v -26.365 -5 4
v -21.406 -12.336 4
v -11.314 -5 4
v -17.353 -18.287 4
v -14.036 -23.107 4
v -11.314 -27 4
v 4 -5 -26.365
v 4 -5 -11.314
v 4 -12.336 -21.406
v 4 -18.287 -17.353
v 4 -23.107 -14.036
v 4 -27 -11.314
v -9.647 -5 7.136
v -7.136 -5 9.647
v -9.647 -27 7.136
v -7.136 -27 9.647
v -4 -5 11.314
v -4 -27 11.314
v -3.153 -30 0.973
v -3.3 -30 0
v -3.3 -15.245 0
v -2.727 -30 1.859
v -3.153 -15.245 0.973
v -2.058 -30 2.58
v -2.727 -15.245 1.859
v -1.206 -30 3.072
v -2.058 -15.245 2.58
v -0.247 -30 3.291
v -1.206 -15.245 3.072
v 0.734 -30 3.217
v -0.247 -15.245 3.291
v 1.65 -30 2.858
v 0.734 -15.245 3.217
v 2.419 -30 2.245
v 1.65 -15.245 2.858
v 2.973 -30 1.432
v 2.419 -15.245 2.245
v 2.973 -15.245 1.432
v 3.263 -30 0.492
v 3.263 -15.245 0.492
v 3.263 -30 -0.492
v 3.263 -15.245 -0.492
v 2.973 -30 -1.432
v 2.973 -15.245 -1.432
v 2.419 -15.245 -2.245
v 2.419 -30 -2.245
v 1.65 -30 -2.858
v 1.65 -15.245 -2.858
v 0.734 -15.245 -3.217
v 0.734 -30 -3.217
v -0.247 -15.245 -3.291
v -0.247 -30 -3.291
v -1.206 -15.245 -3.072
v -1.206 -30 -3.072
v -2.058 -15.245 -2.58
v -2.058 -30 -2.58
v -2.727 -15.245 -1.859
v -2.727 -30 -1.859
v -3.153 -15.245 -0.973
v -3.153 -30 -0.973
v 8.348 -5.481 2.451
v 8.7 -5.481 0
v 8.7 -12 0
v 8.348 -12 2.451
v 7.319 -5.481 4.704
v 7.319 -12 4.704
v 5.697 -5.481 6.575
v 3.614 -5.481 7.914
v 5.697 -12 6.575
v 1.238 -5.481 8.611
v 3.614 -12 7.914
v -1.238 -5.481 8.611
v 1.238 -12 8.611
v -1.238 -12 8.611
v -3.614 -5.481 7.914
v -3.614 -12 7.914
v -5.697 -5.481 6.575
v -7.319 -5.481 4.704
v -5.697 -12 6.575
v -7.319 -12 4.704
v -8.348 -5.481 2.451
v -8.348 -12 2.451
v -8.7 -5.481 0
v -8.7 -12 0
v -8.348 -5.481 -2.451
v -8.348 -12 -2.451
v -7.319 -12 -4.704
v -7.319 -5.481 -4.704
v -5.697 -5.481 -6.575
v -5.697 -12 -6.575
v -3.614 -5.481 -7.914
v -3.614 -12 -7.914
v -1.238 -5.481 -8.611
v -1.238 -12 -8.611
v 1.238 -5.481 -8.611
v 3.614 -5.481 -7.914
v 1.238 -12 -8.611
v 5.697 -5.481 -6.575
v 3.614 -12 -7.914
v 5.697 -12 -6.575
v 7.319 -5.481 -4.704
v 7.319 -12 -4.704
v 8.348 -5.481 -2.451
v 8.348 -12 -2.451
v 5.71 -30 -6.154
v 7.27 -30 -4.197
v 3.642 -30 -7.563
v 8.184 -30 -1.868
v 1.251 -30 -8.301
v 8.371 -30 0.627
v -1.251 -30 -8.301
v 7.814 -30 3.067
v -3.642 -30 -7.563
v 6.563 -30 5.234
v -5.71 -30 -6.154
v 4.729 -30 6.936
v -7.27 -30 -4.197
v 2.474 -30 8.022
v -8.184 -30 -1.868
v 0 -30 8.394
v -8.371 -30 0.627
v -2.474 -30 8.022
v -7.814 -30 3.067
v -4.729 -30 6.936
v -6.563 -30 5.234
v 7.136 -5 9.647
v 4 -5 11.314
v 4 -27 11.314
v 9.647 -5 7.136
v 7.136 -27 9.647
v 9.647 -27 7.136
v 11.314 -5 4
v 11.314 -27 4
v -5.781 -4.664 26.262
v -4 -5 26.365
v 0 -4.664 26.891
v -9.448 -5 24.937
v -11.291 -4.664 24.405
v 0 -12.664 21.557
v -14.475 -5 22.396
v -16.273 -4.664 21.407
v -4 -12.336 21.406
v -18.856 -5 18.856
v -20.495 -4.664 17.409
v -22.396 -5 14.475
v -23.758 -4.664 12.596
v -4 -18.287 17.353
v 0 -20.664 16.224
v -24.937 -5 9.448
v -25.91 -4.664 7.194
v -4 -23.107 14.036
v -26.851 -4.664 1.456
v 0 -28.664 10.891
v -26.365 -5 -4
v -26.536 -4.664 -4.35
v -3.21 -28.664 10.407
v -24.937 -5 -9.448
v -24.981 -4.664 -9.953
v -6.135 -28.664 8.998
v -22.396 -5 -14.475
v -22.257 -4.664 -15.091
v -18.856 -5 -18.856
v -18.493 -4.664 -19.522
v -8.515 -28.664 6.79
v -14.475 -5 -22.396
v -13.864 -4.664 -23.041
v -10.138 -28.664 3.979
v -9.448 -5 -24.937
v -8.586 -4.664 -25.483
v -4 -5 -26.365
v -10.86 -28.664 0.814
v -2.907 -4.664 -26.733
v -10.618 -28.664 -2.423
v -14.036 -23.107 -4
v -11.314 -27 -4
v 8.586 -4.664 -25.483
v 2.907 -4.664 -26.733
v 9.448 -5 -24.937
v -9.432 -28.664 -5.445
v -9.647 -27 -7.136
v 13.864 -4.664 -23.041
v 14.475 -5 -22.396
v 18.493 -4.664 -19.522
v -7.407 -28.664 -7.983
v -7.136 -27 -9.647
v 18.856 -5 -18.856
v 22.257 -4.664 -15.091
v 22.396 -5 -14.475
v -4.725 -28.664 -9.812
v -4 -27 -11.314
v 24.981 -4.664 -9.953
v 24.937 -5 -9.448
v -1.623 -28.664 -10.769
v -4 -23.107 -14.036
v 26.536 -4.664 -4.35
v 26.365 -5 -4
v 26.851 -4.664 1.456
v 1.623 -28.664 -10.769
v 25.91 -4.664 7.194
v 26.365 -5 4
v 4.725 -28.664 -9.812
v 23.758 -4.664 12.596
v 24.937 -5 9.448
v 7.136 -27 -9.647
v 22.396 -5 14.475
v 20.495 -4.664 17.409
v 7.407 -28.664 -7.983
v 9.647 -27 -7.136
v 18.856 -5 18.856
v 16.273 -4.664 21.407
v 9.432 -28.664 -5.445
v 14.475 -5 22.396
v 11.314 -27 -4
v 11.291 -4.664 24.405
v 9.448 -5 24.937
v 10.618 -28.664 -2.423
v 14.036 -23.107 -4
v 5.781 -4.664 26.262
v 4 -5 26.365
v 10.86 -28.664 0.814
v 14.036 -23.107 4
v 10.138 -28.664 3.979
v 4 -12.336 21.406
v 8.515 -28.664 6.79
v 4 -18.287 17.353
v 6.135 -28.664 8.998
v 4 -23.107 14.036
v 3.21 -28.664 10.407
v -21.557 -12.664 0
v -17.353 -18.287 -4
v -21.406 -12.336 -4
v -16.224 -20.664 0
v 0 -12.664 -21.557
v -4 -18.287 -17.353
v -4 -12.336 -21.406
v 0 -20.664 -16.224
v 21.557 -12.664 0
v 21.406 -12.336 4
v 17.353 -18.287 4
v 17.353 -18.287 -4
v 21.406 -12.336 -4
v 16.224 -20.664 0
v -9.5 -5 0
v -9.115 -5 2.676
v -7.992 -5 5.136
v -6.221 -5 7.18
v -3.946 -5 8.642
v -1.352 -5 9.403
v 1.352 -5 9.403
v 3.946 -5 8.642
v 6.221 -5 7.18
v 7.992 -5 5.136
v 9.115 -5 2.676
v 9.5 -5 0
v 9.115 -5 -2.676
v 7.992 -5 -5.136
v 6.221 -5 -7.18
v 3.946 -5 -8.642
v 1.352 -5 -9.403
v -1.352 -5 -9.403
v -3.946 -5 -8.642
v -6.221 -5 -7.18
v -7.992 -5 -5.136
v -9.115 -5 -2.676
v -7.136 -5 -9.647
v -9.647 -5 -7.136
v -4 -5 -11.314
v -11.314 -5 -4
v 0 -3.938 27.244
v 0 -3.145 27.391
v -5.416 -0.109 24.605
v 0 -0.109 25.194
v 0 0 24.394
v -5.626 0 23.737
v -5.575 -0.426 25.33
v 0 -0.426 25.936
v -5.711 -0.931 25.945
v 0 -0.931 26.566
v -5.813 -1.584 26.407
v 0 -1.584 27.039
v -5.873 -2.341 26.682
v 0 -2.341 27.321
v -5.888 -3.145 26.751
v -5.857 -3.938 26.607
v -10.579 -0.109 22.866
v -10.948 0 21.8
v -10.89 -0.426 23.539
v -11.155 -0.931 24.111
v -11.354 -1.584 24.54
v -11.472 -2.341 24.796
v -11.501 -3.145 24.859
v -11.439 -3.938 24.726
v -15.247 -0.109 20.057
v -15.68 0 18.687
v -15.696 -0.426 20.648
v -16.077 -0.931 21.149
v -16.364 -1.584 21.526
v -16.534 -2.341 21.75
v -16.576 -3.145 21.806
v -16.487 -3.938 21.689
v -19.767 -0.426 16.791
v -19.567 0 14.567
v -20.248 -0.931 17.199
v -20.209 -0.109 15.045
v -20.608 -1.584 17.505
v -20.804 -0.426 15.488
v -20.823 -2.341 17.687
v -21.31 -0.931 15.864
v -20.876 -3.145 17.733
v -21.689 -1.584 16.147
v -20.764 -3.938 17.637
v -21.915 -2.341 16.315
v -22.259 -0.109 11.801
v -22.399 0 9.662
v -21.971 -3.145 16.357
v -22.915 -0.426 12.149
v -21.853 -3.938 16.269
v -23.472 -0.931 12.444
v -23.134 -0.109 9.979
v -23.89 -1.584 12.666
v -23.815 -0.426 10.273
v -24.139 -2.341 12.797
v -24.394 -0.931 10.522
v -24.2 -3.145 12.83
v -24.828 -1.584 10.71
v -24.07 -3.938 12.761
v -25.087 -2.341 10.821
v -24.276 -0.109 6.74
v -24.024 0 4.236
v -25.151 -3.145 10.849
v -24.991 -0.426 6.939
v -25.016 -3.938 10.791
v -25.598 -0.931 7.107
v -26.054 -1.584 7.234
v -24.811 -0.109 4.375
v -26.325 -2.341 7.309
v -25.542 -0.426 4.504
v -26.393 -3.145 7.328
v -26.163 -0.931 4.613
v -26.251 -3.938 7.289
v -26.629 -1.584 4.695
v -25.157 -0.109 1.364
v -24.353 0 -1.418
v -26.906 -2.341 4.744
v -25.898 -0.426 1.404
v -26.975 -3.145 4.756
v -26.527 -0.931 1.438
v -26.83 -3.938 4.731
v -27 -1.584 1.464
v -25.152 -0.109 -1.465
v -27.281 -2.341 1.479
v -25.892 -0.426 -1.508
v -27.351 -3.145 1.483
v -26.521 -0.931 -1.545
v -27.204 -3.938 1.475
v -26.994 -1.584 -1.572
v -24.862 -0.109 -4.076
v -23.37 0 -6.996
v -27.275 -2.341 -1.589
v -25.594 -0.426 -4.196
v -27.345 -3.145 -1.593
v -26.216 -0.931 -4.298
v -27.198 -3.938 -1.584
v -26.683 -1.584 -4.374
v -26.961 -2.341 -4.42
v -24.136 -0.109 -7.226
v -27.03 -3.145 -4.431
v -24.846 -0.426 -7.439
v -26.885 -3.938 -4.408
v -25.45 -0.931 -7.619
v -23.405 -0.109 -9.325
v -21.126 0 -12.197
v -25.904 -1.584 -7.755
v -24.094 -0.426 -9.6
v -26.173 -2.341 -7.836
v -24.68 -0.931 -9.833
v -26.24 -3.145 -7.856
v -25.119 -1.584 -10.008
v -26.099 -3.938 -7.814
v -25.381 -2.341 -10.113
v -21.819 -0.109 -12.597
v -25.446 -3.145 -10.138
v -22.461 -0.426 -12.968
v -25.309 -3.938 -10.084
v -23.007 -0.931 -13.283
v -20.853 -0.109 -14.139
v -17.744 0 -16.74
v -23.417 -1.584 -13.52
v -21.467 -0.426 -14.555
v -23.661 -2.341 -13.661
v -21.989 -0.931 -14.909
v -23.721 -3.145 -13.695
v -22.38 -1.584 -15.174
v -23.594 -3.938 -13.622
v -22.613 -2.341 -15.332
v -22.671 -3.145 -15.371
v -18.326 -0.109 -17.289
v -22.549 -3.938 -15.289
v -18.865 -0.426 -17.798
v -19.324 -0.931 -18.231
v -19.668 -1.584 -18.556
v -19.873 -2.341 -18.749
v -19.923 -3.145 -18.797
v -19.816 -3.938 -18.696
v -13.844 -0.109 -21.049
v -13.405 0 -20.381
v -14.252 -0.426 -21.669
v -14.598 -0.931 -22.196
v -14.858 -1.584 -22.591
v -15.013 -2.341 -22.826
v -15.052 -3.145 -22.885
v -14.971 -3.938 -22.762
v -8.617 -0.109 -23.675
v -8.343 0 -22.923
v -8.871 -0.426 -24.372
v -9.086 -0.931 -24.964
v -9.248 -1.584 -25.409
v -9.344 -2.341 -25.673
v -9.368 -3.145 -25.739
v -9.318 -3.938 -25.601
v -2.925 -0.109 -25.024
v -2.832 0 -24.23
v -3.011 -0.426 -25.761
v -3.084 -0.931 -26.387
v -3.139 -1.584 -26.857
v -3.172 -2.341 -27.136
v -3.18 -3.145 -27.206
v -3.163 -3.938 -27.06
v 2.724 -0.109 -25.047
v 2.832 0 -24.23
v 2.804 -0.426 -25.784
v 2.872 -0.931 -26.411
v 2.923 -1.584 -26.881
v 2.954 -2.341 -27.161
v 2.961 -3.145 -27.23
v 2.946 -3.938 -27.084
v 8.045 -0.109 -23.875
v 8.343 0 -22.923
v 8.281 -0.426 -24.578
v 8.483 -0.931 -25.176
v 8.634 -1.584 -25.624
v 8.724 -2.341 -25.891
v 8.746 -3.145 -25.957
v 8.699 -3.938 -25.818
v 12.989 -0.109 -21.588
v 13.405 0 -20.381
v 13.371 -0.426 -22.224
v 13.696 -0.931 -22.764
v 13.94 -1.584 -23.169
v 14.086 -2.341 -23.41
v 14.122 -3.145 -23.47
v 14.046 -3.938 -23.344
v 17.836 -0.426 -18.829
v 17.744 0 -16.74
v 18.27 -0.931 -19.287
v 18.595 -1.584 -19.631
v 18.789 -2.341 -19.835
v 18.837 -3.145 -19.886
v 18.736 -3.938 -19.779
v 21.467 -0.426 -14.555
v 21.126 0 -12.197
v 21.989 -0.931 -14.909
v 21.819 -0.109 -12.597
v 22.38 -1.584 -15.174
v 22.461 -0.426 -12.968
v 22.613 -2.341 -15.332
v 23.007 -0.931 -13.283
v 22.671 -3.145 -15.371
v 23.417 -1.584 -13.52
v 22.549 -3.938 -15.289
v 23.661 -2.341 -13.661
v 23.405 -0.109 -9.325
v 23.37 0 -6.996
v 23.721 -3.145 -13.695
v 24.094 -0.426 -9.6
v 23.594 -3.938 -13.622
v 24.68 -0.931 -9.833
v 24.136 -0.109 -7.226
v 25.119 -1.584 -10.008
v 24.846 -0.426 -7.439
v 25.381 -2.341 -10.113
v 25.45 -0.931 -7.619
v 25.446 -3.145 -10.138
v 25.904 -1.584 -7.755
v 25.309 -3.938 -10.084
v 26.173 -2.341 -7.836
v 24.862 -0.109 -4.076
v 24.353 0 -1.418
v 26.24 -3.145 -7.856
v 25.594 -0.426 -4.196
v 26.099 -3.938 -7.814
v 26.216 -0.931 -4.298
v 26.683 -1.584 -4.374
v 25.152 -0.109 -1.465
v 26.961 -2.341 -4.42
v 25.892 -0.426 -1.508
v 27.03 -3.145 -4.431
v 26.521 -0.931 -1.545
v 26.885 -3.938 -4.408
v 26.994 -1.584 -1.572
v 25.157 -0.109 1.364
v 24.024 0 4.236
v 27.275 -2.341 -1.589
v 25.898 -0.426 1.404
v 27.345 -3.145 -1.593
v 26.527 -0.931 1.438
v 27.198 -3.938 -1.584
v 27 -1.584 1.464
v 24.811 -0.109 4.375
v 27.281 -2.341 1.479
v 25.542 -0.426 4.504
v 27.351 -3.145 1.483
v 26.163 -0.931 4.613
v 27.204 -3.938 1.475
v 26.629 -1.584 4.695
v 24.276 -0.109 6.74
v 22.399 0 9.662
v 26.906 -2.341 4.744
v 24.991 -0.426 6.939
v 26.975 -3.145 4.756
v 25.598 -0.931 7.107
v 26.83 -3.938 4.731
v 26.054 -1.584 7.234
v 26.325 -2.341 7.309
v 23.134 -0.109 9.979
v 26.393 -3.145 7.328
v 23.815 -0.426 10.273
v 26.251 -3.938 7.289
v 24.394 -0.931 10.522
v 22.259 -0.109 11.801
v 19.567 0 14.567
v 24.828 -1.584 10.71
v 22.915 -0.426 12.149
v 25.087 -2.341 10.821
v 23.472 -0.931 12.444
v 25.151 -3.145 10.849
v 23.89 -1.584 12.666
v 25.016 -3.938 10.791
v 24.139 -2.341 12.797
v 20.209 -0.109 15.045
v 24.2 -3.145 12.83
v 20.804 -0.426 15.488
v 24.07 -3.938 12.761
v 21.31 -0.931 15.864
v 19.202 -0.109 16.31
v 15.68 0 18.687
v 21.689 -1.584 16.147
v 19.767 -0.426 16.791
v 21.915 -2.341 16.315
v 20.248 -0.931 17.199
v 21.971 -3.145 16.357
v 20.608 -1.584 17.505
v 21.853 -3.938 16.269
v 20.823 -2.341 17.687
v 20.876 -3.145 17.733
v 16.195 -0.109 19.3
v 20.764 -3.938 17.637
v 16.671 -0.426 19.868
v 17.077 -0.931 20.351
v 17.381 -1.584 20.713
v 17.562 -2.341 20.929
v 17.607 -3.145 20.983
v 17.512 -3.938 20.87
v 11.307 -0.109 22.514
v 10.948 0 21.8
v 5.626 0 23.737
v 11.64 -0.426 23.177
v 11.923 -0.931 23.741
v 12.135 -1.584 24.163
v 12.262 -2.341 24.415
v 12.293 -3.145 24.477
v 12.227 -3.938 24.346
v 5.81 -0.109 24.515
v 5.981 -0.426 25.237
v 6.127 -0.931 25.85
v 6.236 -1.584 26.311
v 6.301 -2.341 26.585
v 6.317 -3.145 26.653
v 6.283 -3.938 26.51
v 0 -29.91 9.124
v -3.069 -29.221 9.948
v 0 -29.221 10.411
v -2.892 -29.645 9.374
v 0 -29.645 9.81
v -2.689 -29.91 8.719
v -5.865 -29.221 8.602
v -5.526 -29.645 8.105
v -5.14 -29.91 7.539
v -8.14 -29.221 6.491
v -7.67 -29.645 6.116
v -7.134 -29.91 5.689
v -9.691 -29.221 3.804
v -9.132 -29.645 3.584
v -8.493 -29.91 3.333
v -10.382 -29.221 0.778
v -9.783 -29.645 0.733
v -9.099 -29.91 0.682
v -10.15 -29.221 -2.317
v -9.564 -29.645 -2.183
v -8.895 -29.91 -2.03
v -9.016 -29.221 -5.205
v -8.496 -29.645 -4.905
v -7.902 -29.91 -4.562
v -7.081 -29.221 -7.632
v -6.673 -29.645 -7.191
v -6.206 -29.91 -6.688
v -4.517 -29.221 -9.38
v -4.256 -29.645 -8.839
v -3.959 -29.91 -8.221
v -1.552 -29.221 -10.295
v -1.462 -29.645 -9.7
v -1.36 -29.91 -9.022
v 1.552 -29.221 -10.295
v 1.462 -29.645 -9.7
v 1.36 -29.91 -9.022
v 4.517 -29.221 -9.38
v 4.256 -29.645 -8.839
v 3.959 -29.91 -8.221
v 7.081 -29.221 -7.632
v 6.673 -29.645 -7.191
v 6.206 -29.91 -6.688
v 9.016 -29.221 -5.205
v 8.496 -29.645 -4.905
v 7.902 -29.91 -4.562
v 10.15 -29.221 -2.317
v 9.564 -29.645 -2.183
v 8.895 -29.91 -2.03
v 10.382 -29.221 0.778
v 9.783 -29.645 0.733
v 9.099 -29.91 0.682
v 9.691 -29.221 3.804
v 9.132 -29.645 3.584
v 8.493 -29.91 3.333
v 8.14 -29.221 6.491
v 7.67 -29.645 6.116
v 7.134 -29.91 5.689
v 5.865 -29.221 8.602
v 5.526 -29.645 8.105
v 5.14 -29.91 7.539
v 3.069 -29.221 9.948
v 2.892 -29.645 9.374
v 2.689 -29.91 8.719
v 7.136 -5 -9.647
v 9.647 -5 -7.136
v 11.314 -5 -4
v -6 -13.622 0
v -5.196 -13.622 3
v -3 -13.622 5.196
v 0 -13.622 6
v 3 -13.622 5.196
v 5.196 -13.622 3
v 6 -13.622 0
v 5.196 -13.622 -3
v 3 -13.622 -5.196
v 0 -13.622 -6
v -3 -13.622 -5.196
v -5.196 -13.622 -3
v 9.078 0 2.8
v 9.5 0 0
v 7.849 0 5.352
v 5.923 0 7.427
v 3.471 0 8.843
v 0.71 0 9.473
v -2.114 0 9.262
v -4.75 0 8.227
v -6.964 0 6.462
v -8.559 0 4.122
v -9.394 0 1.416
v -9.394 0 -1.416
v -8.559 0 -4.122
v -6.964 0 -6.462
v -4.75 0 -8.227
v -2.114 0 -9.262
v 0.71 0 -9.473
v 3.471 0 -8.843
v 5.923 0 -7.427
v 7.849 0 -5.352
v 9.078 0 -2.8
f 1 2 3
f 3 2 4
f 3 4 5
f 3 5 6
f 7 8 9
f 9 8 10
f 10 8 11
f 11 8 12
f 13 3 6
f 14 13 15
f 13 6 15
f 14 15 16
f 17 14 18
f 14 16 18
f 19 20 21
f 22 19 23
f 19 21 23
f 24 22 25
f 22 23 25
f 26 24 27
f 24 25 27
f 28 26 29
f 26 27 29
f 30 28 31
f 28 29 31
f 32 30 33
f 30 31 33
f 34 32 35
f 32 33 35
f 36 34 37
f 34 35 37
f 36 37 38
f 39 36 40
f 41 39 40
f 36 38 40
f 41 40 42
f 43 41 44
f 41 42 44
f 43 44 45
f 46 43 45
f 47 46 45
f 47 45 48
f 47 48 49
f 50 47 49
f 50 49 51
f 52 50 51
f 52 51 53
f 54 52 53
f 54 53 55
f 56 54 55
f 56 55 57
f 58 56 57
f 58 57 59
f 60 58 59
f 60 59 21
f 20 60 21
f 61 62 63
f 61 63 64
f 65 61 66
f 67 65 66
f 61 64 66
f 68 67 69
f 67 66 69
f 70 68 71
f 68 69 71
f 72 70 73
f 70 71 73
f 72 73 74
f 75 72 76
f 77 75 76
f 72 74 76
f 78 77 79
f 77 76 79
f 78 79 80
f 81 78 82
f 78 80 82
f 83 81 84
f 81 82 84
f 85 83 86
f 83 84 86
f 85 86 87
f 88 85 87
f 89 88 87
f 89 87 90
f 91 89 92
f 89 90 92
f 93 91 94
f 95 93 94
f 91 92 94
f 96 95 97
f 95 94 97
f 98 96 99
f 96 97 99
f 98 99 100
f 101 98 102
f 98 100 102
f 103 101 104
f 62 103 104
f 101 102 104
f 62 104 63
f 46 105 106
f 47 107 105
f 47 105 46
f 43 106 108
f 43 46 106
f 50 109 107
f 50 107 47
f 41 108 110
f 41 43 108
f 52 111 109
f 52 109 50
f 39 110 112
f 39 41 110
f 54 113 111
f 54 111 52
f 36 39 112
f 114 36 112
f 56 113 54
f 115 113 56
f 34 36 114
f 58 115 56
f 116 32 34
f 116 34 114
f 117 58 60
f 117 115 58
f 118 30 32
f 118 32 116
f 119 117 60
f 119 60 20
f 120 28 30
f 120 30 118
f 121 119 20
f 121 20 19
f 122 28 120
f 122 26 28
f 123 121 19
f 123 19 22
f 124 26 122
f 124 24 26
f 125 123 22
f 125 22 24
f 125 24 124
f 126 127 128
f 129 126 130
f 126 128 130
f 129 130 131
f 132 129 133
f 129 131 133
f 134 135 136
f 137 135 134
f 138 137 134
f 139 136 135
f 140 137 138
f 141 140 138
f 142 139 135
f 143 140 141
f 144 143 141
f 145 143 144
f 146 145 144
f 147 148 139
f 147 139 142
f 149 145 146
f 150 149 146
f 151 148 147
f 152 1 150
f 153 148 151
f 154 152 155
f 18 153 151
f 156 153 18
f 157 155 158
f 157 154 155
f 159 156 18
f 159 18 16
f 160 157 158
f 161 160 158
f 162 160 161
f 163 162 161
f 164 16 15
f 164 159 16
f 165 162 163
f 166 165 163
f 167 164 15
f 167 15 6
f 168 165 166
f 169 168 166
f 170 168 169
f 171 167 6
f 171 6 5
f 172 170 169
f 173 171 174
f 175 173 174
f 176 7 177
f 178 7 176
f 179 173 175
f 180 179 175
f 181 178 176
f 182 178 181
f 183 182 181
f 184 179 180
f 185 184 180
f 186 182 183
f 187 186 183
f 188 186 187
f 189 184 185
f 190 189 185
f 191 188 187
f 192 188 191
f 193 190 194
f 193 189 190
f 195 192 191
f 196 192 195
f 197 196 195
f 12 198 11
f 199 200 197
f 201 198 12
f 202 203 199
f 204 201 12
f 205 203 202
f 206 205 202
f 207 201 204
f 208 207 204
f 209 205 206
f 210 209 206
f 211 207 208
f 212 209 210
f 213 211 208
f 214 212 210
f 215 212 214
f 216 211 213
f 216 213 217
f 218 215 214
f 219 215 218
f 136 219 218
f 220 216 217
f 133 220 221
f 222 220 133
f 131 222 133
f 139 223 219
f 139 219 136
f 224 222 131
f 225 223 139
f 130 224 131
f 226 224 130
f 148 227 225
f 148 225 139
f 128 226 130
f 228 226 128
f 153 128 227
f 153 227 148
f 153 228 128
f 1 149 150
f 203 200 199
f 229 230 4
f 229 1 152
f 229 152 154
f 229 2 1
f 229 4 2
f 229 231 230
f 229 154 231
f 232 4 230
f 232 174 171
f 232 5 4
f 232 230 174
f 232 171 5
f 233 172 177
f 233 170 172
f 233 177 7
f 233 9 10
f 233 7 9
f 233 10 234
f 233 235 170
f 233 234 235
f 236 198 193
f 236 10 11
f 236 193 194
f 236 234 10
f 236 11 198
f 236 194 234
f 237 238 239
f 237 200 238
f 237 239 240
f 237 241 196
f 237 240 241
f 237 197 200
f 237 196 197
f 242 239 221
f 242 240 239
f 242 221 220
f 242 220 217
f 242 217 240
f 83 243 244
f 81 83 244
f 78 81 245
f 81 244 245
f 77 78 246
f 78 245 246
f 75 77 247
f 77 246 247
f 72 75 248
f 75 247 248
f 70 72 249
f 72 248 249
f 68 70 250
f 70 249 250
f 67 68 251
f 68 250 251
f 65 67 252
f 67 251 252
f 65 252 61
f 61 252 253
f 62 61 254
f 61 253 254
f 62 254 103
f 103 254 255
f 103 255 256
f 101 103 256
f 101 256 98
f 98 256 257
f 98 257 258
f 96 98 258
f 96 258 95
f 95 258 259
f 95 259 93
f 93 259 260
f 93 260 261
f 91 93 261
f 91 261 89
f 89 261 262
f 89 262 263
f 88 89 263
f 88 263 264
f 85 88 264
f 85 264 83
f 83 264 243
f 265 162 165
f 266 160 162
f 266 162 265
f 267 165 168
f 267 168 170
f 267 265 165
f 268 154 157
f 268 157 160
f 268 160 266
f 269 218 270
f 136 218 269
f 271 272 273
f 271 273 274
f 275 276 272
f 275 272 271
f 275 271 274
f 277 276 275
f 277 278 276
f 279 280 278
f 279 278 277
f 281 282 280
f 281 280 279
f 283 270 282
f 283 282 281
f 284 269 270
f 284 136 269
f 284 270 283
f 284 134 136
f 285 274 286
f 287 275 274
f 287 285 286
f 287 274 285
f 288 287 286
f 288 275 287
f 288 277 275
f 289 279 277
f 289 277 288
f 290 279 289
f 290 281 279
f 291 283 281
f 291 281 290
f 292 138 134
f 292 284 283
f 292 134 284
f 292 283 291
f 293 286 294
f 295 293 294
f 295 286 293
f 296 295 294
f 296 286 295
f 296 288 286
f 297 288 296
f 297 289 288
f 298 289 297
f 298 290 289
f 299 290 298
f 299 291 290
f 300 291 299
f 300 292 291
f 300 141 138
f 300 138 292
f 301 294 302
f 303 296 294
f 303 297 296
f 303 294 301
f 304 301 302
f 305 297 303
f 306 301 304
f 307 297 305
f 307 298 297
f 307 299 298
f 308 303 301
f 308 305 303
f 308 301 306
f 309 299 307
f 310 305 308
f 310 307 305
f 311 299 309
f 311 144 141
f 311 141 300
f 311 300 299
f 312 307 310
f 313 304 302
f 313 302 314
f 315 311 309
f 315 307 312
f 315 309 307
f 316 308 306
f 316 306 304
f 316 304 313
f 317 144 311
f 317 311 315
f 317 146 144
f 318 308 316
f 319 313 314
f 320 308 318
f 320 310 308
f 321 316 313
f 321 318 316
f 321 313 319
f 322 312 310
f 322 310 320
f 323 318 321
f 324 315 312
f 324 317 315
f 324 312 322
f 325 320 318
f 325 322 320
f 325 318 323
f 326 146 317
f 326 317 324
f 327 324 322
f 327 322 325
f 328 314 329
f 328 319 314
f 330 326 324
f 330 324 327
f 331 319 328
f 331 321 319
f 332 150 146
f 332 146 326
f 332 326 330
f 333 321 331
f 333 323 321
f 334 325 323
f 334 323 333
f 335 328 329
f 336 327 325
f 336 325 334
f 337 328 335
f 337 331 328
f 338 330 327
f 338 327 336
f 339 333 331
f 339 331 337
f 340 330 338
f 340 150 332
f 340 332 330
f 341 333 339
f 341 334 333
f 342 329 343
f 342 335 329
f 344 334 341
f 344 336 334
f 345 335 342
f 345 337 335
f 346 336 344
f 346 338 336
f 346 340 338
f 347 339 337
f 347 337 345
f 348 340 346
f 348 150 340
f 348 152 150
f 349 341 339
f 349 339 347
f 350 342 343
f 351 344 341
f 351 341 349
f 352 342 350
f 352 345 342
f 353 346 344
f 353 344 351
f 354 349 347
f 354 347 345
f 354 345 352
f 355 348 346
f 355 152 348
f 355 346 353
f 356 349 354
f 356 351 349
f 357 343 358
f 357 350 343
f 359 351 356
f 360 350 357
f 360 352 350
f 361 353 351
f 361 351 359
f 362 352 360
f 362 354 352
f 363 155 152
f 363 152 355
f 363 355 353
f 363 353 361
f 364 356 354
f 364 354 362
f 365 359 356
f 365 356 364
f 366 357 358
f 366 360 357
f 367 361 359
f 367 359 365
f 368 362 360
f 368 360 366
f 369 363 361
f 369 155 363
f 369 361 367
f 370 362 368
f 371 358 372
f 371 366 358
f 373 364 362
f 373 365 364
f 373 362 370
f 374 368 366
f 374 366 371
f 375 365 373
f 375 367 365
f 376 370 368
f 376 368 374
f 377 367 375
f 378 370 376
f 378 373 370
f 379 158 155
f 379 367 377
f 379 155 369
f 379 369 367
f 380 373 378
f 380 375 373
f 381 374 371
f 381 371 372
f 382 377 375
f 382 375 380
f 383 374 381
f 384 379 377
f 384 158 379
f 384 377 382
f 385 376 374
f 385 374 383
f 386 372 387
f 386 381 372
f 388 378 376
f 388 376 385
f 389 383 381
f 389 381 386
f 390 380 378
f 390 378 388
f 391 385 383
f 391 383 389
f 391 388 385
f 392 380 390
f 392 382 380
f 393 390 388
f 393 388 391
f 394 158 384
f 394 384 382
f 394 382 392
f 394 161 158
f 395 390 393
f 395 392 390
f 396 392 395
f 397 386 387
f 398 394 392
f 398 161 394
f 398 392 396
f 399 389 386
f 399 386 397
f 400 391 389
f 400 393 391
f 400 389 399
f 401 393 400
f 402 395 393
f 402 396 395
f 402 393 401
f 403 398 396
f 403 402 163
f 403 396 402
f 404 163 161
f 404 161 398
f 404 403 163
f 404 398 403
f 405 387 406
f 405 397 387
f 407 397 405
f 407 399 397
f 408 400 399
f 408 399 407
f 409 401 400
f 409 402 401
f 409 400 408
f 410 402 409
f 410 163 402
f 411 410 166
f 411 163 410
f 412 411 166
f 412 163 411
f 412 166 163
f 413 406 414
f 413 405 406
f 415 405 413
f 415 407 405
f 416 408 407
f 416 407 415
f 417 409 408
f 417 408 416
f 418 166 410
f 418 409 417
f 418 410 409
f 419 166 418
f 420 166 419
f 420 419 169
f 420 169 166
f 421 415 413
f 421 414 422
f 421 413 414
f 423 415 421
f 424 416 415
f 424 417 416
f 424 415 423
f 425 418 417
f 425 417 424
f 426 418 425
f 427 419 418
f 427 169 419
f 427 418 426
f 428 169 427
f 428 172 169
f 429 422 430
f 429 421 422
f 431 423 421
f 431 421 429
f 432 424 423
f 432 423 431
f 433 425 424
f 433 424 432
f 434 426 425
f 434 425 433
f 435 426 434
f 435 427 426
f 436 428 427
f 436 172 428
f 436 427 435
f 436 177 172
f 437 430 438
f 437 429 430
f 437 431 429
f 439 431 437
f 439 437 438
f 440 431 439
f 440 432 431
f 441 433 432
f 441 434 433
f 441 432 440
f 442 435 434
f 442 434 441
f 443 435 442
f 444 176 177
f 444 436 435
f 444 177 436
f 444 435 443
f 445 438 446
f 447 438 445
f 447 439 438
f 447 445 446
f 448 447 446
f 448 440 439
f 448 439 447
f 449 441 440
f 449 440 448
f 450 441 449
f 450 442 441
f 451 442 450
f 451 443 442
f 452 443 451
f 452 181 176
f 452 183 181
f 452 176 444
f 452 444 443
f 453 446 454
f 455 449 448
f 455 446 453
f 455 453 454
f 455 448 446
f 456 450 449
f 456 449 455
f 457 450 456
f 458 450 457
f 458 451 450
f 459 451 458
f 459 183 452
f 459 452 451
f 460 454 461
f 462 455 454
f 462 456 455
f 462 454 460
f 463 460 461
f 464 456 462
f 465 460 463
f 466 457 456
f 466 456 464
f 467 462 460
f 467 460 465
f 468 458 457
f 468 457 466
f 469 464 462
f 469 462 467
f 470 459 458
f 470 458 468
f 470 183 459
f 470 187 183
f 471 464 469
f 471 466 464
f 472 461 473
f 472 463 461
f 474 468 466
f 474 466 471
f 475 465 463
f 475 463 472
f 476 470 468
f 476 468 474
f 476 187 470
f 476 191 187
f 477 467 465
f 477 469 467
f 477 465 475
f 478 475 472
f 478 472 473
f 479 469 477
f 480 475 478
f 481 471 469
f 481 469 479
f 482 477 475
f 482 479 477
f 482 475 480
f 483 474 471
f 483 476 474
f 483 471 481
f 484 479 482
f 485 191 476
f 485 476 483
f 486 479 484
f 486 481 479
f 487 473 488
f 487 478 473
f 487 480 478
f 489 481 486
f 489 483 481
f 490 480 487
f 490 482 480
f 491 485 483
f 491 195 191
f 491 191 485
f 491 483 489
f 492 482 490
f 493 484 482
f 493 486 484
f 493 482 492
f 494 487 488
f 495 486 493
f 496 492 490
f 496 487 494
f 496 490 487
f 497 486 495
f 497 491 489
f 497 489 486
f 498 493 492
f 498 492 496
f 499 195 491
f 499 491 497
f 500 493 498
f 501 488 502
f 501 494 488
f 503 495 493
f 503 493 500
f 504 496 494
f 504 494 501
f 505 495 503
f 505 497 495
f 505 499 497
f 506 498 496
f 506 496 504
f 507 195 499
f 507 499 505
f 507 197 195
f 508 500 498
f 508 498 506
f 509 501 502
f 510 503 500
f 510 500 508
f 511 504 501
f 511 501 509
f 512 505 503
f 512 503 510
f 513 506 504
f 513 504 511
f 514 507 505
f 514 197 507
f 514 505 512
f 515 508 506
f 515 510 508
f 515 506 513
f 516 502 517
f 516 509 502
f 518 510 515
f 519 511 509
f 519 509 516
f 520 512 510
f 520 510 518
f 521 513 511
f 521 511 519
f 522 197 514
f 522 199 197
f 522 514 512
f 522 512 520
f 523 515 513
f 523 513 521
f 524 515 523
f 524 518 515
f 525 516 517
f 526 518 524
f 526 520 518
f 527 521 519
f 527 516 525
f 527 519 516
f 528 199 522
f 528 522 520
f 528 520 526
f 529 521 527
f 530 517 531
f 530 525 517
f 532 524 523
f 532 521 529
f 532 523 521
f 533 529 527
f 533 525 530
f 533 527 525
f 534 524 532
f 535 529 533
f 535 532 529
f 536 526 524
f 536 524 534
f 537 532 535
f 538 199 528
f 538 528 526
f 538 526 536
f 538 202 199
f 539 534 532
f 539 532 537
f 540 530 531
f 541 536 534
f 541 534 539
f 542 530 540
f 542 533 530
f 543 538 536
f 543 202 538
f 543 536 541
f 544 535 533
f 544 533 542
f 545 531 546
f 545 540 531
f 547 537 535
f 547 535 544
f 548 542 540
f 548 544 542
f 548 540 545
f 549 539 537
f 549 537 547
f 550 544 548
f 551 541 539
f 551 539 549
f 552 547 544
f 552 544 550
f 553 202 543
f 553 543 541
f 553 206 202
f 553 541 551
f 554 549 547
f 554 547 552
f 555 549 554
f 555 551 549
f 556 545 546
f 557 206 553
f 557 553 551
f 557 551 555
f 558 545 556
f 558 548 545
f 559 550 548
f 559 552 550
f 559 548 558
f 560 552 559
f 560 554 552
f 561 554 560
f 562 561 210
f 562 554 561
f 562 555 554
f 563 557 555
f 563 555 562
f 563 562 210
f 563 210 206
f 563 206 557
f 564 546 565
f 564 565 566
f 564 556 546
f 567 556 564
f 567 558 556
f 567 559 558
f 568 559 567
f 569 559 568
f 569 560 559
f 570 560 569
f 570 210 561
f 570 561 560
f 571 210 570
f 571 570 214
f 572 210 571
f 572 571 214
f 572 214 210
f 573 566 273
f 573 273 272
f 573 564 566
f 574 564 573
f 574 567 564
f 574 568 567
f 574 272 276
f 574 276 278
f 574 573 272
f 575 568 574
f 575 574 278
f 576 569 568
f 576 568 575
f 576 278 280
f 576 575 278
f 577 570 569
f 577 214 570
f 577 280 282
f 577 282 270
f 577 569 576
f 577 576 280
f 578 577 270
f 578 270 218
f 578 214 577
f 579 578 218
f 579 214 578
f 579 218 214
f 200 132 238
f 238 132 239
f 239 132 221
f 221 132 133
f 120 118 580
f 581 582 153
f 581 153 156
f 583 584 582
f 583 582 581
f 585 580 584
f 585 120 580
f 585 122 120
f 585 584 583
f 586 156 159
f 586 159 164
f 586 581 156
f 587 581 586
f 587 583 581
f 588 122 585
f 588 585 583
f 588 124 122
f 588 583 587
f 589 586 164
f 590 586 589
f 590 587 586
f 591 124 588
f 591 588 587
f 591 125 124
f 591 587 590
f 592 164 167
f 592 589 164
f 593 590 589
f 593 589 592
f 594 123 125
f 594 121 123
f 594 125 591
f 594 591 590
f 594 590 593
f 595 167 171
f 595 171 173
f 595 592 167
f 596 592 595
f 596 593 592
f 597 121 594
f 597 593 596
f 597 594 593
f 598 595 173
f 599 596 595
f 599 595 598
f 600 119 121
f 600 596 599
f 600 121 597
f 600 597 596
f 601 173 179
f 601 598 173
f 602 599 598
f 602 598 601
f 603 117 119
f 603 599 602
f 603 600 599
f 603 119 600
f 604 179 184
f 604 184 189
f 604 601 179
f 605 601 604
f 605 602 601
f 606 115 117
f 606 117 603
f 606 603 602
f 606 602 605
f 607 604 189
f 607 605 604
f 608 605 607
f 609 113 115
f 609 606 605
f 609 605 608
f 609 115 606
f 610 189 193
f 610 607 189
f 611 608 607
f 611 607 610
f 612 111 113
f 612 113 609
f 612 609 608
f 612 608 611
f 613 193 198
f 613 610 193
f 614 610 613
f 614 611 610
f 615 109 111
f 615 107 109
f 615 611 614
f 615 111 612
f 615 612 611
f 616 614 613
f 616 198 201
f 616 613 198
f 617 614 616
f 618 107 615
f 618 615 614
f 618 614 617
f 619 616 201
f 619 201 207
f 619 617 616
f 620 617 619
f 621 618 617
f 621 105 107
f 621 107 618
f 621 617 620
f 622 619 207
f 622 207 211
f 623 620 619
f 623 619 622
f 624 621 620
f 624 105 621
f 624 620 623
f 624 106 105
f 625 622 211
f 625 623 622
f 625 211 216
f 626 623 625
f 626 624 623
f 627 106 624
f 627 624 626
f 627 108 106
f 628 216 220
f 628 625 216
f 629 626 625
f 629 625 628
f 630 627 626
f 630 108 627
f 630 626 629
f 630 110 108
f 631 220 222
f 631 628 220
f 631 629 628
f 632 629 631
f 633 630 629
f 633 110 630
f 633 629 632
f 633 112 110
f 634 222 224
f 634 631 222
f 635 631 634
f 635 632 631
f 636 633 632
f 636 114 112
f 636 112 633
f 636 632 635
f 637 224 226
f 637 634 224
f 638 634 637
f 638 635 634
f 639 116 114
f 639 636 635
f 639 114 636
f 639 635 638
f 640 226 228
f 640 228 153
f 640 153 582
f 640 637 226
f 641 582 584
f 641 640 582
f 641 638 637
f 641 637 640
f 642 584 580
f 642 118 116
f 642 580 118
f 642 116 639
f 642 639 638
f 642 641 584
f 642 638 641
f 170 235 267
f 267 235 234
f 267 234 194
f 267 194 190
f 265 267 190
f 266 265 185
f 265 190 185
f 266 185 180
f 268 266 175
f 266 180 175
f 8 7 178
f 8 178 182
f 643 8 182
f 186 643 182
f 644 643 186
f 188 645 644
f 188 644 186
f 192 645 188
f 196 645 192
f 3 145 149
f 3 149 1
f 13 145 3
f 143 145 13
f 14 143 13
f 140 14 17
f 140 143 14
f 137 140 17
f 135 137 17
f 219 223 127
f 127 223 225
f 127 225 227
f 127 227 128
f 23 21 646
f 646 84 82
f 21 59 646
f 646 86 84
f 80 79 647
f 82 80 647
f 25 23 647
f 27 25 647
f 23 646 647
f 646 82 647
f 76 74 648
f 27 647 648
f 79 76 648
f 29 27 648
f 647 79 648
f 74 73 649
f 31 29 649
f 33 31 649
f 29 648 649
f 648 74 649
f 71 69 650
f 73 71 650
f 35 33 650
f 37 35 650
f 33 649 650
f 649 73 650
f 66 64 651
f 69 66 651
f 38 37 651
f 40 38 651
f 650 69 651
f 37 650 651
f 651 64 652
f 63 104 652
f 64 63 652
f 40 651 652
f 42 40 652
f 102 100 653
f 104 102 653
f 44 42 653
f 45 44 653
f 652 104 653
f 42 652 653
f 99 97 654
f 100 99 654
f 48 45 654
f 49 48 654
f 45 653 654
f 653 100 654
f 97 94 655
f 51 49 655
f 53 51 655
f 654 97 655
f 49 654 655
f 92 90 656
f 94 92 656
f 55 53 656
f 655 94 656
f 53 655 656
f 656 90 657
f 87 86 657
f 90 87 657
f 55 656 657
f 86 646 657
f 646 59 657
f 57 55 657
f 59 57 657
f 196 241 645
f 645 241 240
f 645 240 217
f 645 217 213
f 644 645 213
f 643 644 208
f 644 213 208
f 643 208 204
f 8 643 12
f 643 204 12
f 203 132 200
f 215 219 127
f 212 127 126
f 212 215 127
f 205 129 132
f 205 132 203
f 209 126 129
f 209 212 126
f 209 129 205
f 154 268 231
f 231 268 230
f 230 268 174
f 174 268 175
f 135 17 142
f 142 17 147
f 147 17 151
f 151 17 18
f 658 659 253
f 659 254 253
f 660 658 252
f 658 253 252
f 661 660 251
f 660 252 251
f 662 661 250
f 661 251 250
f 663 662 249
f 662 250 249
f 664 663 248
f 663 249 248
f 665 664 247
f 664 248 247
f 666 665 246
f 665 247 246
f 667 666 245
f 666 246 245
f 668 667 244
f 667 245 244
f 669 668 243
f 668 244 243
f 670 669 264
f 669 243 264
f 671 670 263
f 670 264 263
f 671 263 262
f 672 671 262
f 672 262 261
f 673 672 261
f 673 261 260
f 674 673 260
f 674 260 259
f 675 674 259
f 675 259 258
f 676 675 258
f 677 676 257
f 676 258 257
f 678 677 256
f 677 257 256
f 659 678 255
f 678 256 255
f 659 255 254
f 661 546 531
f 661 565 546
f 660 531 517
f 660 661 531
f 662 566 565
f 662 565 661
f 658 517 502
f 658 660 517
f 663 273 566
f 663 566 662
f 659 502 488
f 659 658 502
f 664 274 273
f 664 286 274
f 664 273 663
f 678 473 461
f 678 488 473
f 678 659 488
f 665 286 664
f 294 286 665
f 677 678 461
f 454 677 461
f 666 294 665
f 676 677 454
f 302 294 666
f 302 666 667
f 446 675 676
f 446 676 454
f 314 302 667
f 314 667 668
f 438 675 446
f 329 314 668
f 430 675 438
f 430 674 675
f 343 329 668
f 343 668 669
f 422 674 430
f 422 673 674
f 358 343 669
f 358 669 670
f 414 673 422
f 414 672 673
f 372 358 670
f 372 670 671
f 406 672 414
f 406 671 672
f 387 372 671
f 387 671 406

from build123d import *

# Parameters (mm, degrees)
F3_D     = 6.6
F5_D     = 17.4
F5_DEPTH = 12
F5_TIP   = 5.2274873855
F6_D     = 19
F6_DEPTH = 5
F6_TIP   = 5.7081758808
F7_DEPTH = 25
F8_R     = 3


with BuildPart() as f1:
    # F0 (on Right) → F1 (revolve)
    with BuildSketch(Plane.YZ):
        Polygon((-30, 0), (0, 0), (0, 30), (-30, 10), align=None)
    revolve(axis=Axis((0, -15, 0), (0, -1, 0)))

    # F3 (through all)
    with Locations(Plane.XZ.offset(30)):
        with Locations((0, 0)):
            Hole(F3_D / 2)

    # F5
    with Locations(Plane(origin=(0, 0, 0), x_dir=(-1, 0, 0), z_dir=(0, 1, 0))):
        with Locations((0, 0)):
            Hole(F5_D / 2, depth=F5_DEPTH)
            with Locations((0, 0, -(F5_DEPTH + F5_TIP / 2))):  # 118° drill point
                Cone(0, F5_D / 2, F5_TIP, mode=Mode.SUBTRACT)

    # F6
    with Locations(Plane(origin=(0, 0, 0), x_dir=(-1, 0, 0), z_dir=(0, 1, 0))):
        with Locations((0, 0)):
            Hole(F6_D / 2, depth=F6_DEPTH)
            with Locations((0, 0, -(F6_DEPTH + F6_TIP / 2))):  # 118° drill point
                Cone(0, F6_D / 2, F6_TIP, mode=Mode.SUBTRACT)

    # F2 (on face) → F7 (cut)
    with BuildSketch(Plane.XZ.offset(30)):
        with BuildLine():
            ThreePointArc((11.313708499, -4), (8.4852813742, -8.4852813742), (4, -11.313708499))
            Line((4, -11.313708499), (4, -27.313708499))
            ThreePointArc((4, -27.313708499), (19.5197165959, -19.5197165959), (27.313708499, -4))
            Line((27.313708499, -4), (11.313708499, -4))
        make_face()
        with BuildLine():
            Line((11.313708499, 4), (27.313708499, 4))
            ThreePointArc((27.313708499, 4), (19.5197165959, 19.5197165959), (4, 27.313708499))
            Line((4, 27.313708499), (4, 11.313708499))
            ThreePointArc((4, 11.313708499), (8.4852813742, 8.4852813742), (11.313708499, 4))
        make_face()
        with BuildLine():
            Line((-4, 11.313708499), (-4, 27.313708499))
            ThreePointArc((-4, 27.313708499), (-19.5197165959, 19.5197165959), (-27.313708499, 4))
            Line((-27.313708499, 4), (-11.313708499, 4))
            ThreePointArc((-11.313708499, 4), (-8.4852813742, 8.4852813742), (-4, 11.313708499))
        make_face()
        with BuildLine():
            Line((-11.313708499, -4), (-27.313708499, -4))
            ThreePointArc((-27.313708499, -4), (-19.5197165959, -19.5197165959), (-4, -27.313708499))
            Line((-4, -27.313708499), (-4, -11.313708499))
            ThreePointArc((-4, -11.313708499), (-8.4852813742, -8.4852813742), (-11.313708499, -4))
        make_face()
    extrude(amount=-F7_DEPTH, mode=Mode.SUBTRACT)

    # F8
    f8_edges = [f1.edges().sort_by_distance(p)[0] for p in [
        (0, 0, -30),
        (0, -30, -10),
    ]]
    fillet(f8_edges, radius=F8_R)


solid = f1.part
